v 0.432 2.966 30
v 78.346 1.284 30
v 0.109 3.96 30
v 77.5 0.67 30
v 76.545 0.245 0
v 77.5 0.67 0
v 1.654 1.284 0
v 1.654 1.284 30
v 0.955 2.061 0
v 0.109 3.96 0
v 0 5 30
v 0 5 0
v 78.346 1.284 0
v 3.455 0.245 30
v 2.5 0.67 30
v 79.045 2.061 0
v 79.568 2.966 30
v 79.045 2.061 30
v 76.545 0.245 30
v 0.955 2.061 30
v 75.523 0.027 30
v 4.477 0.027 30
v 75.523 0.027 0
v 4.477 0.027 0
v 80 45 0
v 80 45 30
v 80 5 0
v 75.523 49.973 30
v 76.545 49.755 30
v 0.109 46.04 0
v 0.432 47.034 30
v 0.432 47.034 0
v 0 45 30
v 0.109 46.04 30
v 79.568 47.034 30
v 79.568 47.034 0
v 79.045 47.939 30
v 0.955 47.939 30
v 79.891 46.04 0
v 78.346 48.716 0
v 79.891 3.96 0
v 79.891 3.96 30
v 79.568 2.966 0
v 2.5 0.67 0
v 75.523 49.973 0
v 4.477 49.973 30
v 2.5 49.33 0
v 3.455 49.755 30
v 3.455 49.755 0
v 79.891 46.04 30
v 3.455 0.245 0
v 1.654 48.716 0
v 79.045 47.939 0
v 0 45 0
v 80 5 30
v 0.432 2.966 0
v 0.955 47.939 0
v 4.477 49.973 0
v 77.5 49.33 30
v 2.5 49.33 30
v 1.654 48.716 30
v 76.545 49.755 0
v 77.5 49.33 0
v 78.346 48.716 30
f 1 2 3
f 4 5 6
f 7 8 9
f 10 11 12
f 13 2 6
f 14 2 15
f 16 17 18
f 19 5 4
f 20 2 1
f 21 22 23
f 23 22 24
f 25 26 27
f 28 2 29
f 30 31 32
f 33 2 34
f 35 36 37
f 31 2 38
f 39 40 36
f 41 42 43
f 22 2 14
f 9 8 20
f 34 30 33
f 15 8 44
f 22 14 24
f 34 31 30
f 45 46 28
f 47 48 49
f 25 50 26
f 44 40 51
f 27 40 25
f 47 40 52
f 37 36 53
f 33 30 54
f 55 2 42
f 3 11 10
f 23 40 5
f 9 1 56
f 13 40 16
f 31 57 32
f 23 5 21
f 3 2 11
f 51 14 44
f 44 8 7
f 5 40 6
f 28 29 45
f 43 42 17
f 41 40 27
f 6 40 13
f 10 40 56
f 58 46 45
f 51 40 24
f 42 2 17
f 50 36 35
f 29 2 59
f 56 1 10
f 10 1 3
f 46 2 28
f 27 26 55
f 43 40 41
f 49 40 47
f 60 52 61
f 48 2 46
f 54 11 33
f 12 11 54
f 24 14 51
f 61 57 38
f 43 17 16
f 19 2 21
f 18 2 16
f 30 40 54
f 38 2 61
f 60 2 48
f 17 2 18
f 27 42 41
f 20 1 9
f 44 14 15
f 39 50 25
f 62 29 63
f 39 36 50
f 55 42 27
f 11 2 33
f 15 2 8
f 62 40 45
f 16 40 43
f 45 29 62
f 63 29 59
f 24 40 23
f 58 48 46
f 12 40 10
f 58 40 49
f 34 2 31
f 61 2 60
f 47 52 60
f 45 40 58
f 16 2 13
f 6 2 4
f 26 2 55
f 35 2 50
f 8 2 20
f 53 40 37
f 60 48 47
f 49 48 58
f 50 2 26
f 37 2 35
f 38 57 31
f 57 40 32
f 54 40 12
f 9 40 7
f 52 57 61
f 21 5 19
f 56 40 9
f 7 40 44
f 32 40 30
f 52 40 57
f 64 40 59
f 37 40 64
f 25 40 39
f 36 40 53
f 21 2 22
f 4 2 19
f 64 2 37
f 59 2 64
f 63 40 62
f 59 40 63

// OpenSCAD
$fs=0.1;

BoxV(80,50,30,10);

module BoxV(width,depth,height,dia) {
 hull() {
  translate([dia/2,dia/2,0])cylinder(d=dia,h=height);
  translate([width-dia/2,dia/2,0])cylinder(d=dia,h=height);
  translate([width-dia/2,depth-dia/2,0])cylinder(d=dia,h=height);
  translate([dia/2,depth-dia/2,0])cylinder(d=dia,h=height);
 } 
}
